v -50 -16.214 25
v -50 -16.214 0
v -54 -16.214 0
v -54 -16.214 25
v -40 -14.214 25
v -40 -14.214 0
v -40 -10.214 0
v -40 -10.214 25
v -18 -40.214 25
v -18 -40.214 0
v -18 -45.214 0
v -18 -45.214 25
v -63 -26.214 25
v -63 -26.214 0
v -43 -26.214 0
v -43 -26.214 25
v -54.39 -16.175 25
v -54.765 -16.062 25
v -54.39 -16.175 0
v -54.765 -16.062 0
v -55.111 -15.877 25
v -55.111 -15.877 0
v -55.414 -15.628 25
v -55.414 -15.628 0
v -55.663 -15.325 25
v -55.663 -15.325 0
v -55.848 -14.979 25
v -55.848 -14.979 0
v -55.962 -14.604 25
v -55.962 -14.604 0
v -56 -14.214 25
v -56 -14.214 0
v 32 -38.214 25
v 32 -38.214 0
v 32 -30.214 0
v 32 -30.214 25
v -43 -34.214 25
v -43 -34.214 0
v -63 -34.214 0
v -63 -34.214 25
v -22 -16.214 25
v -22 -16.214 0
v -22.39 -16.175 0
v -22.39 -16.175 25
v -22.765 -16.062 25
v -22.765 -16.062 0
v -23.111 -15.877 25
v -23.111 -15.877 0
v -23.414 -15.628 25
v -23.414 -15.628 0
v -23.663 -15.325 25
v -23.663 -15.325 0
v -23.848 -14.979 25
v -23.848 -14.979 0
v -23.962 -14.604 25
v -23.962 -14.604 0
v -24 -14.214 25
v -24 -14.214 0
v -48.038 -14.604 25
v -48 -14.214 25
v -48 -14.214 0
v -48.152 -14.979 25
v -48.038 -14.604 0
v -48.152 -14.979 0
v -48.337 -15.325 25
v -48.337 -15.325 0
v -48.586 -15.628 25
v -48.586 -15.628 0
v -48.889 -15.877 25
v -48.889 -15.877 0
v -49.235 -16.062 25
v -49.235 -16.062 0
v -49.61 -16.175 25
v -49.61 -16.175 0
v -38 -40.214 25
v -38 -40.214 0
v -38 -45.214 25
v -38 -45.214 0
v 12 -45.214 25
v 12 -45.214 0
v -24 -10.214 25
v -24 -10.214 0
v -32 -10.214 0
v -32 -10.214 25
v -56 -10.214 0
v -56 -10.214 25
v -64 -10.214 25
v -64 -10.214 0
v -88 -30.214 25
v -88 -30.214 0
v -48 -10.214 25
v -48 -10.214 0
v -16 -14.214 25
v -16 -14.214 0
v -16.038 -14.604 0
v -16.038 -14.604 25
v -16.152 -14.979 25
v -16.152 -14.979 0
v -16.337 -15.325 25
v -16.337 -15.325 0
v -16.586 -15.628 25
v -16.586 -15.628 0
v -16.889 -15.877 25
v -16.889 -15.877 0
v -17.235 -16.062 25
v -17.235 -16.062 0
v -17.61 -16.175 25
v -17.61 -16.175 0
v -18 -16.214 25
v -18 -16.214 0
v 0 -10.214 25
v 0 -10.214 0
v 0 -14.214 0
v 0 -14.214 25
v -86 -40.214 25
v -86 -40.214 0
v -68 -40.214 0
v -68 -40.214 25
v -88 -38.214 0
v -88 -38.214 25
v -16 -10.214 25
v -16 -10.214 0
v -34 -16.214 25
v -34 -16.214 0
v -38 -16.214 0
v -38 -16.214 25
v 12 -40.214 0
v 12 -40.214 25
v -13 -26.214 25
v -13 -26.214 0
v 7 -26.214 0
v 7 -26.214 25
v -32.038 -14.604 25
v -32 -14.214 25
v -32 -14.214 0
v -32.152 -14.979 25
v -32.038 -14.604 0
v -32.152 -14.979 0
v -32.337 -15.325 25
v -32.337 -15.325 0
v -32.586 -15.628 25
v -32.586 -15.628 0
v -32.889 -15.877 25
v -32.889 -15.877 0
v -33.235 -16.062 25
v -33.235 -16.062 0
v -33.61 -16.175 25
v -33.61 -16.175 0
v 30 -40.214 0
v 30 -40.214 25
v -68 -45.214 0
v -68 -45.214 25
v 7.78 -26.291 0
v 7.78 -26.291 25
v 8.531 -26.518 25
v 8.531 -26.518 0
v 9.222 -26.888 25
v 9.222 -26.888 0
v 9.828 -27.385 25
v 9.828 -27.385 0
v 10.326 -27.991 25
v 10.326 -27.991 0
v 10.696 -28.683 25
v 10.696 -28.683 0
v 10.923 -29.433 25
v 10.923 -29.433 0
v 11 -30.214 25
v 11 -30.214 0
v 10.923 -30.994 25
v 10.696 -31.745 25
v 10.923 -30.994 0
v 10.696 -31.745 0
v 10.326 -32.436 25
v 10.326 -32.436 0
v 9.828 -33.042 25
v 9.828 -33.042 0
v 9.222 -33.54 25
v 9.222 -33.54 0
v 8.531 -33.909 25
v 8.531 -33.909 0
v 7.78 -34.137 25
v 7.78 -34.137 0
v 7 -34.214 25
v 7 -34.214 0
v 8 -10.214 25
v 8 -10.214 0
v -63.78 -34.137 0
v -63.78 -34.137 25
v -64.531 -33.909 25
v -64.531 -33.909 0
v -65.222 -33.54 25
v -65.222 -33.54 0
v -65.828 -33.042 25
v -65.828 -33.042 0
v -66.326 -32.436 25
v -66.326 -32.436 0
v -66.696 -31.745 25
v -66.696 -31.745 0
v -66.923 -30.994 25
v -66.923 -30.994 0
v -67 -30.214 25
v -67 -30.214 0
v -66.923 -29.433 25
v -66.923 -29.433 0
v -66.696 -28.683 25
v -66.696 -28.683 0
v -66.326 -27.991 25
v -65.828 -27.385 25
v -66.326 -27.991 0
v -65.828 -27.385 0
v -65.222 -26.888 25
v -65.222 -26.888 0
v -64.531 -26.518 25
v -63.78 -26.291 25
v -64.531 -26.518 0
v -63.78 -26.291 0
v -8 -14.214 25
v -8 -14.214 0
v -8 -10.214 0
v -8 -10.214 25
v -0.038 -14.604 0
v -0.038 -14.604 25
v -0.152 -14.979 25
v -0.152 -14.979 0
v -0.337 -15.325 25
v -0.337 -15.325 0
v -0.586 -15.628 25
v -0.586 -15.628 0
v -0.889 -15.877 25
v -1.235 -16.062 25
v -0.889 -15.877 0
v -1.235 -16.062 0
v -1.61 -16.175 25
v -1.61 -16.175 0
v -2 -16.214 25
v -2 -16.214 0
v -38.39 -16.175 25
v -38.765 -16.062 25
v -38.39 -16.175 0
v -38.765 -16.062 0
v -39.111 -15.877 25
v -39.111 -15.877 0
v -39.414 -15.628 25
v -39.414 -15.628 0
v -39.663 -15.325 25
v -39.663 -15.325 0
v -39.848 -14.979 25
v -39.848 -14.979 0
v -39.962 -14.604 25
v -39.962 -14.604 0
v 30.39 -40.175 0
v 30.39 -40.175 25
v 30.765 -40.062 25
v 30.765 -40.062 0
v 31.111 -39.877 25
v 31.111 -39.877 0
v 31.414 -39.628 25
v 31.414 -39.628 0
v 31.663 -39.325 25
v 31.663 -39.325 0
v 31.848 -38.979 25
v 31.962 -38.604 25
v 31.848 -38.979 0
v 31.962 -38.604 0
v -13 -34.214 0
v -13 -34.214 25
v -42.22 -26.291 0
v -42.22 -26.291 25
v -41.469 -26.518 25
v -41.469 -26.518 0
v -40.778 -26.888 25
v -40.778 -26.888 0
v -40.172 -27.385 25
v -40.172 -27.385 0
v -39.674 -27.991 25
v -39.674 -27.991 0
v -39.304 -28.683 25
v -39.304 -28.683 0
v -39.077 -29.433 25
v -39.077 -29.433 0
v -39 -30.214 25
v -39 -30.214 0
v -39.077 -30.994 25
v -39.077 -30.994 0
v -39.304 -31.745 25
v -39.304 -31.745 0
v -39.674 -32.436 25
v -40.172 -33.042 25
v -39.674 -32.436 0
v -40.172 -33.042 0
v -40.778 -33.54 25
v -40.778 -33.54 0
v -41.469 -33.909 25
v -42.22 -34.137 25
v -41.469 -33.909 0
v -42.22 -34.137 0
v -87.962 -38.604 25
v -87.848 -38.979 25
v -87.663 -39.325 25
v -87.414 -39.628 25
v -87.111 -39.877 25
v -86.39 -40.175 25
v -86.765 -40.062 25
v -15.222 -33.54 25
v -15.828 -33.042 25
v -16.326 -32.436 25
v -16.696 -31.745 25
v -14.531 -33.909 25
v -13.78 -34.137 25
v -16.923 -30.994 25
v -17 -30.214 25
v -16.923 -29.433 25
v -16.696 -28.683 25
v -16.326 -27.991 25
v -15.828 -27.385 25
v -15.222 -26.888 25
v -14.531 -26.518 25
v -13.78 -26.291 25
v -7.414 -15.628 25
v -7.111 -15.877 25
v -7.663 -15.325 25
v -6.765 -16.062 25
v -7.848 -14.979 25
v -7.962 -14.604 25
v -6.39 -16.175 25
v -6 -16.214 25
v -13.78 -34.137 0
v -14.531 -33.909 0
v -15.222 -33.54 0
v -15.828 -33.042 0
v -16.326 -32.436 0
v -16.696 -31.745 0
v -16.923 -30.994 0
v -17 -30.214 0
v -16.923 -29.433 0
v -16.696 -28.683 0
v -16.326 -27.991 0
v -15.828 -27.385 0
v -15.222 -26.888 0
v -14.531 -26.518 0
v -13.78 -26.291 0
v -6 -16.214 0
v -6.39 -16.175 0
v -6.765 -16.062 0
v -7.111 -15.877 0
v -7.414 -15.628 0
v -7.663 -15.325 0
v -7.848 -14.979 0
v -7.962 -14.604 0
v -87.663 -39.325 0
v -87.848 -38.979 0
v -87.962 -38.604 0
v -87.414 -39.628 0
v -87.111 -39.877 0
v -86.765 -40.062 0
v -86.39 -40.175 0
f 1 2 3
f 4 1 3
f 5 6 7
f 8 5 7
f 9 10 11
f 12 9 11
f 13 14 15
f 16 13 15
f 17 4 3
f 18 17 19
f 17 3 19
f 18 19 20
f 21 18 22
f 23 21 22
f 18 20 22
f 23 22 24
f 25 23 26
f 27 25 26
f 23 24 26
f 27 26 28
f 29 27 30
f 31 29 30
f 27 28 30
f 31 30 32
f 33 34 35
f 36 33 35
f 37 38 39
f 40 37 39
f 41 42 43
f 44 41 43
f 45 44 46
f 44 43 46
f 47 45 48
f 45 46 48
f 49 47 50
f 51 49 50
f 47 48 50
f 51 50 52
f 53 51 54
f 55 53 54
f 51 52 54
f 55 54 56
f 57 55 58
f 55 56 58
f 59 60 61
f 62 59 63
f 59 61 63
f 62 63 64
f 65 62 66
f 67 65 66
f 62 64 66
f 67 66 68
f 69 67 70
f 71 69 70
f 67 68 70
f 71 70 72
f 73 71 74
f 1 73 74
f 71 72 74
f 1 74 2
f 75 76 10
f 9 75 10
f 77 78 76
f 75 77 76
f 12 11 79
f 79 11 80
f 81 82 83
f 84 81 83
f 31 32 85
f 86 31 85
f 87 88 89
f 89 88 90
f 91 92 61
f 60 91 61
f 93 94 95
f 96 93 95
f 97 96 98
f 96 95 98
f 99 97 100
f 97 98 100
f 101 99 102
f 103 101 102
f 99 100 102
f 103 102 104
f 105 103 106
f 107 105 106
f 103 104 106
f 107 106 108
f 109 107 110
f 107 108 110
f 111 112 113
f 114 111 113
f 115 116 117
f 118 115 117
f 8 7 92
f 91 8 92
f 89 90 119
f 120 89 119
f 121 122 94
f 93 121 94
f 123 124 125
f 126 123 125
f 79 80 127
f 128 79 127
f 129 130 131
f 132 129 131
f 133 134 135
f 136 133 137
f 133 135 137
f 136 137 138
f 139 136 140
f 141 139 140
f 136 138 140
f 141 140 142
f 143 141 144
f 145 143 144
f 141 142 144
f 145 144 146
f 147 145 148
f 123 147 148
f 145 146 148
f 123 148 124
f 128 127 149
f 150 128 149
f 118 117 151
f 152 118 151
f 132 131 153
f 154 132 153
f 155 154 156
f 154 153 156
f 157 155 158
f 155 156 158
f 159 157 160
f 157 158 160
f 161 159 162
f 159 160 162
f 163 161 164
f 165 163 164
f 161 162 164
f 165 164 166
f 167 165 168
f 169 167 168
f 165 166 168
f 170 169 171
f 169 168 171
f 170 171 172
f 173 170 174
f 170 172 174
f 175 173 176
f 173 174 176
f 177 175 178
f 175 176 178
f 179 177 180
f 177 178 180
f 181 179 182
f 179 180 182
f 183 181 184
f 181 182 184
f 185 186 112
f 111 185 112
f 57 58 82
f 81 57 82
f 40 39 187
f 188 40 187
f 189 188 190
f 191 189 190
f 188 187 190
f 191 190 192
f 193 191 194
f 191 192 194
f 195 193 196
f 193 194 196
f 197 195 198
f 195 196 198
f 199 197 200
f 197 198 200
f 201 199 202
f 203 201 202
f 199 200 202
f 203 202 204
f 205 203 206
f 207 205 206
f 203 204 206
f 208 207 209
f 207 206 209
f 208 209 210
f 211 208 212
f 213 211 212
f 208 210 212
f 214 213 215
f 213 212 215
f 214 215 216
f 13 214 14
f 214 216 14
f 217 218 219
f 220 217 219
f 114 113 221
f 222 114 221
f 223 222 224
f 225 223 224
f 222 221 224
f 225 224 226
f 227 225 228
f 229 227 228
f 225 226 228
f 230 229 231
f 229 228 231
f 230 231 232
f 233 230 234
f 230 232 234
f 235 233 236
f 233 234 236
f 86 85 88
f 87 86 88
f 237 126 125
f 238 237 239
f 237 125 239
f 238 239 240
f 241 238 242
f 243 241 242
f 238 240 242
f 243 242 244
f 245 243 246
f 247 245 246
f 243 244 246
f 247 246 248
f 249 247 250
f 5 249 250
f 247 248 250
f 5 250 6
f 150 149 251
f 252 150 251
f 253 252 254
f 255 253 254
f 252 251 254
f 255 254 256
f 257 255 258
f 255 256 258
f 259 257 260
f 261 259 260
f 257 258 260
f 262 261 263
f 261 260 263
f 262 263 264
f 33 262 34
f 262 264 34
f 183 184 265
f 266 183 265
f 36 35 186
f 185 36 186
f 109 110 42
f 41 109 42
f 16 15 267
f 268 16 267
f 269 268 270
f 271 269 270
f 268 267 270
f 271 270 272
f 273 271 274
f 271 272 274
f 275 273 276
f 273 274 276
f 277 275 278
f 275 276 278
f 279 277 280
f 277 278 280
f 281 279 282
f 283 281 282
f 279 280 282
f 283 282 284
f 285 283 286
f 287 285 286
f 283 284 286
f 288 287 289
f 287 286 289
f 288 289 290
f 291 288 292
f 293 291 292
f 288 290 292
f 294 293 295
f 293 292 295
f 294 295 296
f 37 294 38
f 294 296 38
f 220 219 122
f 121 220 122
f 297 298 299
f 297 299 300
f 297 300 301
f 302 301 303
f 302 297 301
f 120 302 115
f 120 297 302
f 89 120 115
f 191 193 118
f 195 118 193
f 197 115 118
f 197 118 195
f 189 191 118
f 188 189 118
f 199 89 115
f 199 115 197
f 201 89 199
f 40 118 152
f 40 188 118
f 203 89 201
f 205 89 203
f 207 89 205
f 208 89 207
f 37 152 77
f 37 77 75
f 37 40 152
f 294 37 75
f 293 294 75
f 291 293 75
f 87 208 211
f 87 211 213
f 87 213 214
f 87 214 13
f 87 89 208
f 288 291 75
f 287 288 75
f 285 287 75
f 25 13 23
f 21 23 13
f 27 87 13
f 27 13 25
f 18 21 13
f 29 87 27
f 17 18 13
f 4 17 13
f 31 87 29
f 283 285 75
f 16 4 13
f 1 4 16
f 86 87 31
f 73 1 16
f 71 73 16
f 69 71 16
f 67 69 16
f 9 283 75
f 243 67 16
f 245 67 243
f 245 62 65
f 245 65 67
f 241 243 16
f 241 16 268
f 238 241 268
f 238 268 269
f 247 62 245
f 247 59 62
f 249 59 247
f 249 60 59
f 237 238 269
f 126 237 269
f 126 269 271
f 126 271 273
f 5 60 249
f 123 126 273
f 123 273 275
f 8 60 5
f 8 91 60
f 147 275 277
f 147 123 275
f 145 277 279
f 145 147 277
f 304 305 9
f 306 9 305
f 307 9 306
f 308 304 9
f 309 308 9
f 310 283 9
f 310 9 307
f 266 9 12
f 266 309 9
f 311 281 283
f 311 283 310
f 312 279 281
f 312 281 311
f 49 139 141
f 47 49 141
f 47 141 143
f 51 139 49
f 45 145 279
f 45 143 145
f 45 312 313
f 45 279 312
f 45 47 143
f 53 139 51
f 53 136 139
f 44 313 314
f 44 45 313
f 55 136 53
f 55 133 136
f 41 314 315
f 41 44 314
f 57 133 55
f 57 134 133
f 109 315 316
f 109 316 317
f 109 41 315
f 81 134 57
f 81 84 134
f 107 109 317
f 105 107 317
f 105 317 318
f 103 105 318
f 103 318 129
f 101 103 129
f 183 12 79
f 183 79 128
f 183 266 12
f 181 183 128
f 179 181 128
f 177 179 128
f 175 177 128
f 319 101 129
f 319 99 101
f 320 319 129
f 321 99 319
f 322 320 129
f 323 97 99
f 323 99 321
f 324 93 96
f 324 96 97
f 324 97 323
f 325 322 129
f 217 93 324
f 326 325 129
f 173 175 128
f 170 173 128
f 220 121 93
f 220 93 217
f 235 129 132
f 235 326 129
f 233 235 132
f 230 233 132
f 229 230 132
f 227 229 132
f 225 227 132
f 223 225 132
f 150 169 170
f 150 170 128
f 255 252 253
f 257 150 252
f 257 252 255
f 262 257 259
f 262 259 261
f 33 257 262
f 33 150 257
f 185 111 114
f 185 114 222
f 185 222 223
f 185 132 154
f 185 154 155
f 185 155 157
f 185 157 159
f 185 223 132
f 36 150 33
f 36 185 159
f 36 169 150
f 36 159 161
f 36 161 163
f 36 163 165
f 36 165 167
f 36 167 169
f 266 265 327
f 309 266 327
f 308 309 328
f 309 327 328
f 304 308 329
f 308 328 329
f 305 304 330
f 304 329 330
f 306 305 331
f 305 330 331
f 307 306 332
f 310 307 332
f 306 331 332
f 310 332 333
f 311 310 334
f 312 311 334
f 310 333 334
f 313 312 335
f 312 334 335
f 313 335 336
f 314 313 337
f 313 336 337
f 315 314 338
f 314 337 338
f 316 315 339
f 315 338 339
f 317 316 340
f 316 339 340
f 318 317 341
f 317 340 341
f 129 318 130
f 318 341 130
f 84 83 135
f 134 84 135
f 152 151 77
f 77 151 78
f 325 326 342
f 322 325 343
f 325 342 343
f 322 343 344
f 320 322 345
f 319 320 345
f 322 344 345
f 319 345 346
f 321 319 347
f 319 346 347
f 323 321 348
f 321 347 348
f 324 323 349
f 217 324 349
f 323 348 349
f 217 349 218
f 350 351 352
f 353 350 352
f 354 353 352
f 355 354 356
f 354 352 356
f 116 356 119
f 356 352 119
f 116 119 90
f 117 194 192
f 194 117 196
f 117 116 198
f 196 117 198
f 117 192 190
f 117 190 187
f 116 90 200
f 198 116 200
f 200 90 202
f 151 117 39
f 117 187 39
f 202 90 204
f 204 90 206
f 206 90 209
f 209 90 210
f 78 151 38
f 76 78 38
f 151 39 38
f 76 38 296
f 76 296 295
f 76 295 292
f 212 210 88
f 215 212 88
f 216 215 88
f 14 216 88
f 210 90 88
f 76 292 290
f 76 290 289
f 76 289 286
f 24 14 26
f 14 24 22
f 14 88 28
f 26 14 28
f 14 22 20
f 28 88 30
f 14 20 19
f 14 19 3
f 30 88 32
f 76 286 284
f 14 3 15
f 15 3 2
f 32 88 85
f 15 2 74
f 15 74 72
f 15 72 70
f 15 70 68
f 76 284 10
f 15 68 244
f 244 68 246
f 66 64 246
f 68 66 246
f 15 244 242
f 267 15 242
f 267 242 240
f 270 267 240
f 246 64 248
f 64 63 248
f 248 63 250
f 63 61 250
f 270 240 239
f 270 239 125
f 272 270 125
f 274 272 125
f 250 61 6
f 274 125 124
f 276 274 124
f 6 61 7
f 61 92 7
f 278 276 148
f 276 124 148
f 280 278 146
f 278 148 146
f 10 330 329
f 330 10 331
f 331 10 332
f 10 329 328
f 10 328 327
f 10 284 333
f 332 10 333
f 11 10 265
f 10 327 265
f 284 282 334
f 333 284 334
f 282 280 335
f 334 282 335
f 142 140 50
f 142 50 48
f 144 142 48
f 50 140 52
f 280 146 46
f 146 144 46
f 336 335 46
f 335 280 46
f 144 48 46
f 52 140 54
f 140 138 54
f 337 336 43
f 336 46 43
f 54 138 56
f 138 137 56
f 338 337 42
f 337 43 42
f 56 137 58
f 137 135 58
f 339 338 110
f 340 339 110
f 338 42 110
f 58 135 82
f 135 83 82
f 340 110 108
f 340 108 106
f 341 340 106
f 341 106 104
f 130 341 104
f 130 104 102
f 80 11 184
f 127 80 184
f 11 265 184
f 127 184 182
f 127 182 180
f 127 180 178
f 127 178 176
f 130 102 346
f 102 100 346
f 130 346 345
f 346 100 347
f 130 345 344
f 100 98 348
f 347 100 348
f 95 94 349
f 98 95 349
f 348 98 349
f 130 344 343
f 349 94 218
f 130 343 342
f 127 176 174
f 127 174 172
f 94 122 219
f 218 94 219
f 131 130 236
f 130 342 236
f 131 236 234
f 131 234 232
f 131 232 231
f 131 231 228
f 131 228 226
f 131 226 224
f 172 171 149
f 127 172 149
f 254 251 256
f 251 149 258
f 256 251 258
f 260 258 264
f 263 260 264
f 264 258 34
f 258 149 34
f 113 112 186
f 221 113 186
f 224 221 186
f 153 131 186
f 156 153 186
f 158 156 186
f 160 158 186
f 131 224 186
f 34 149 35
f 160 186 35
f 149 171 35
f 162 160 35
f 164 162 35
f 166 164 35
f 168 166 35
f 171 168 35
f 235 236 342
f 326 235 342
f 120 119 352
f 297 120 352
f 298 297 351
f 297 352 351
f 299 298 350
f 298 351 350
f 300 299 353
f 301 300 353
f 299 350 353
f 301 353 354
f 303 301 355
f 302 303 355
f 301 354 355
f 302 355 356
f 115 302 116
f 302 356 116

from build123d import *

# Parameters (mm, degrees)
F1_DEPTH = 25


with BuildPart() as f1:
    # F0 (on Top) → F1 (new body)
    with BuildSketch(Plane.XY):
        with BuildLine():
            Line((-68, -40.213773), (-68, -45.213773))
            Line((-68, -45.213773), (-38, -45.213773))
            Line((-38, -45.213773), (-38, -40.213773))
            Line((-38, -40.213773), (-28, -40.213773))
            Line((-28, -40.213773), (-28, -10.213773))
            Line((-28, -10.213773), (-32, -10.213773))
            Line((-32, -10.213773), (-32, -14.213773))
            ThreePointArc((-32, -14.213773), (-32.585786, -15.627986), (-34, -16.213773))
            Line((-34, -16.213773), (-38, -16.213773))
            ThreePointArc((-38, -16.213773), (-39.414214, -15.627986), (-40, -14.213773))
            Line((-40, -14.213773), (-40, -10.213773))
            Line((-40, -10.213773), (-48, -10.213773))
            Line((-48, -10.213773), (-48, -14.213773))
            ThreePointArc((-48, -14.213773), (-48.585786, -15.627986), (-50, -16.213773))
            Line((-50, -16.213773), (-54, -16.213773))
            ThreePointArc((-54, -16.213773), (-55.414214, -15.627986), (-56, -14.213773))
            Line((-56, -14.213773), (-56, -10.213773))
            Line((-56, -10.213773), (-64, -10.213773))
            Line((-64, -10.213773), (-88, -30.213773))
            Line((-88, -30.213773), (-88, -38.213773))
            ThreePointArc((-88, -38.213773), (-87.414214, -39.627986), (-86, -40.213773))
            Line((-86, -40.213773), (-68, -40.213773))
        make_face()
        with BuildLine():
            Line((-63, -26.213773), (-43, -26.213773))
            ThreePointArc((-43, -26.213773), (-39, -30.213773), (-43, -34.213773))
            Line((-43, -34.213773), (-63, -34.213773))
            ThreePointArc((-63, -34.213773), (-67, -30.213773), (-63, -26.213773))
        make_face(mode=Mode.SUBTRACT)
        with BuildLine():
            Line((-28, -10.213773), (-28, -40.213773))
            Line((-28, -40.213773), (-18, -40.213773))
            Line((-18, -40.213773), (-18, -45.213773))
            Line((-18, -45.213773), (12, -45.213773))
            Line((12, -45.213773), (12, -40.213773))
            Line((12, -40.213773), (30, -40.213773))
            ThreePointArc((30, -40.213773), (31.414214, -39.627986), (32, -38.213773))
            Line((32, -38.213773), (32, -30.213773))
            Line((32, -30.213773), (8, -10.213773))
            Line((8, -10.213773), (0, -10.213773))
            Line((0, -10.213773), (0, -14.213773))
            ThreePointArc((0, -14.213773), (-0.585786, -15.627986), (-2, -16.213773))
            Line((-2, -16.213773), (-6, -16.213773))
            ThreePointArc((-6, -16.213773), (-7.414214, -15.627986), (-8, -14.213773))
            Line((-8, -14.213773), (-8, -10.213773))
            Line((-8, -10.213773), (-16, -10.213773))
            Line((-16, -10.213773), (-16, -14.213773))
            ThreePointArc((-16, -14.213773), (-16.585786, -15.627986), (-18, -16.213773))
            Line((-18, -16.213773), (-22, -16.213773))
            ThreePointArc((-22, -16.213773), (-23.414214, -15.627986), (-24, -14.213773))
            Line((-24, -14.213773), (-24, -10.213773))
            Line((-24, -10.213773), (-28, -10.213773))
        make_face()
        with BuildLine():
            Line((7, -34.213773), (-13, -34.213773))
            ThreePointArc((-13, -34.213773), (-17, -30.213773), (-13, -26.213773))
            Line((-13, -26.213773), (7, -26.213773))
            ThreePointArc((7, -26.213773), (11, -30.213773), (7, -34.213773))
        make_face(mode=Mode.SUBTRACT)
    extrude(amount=F1_DEPTH)


solid = f1.part
